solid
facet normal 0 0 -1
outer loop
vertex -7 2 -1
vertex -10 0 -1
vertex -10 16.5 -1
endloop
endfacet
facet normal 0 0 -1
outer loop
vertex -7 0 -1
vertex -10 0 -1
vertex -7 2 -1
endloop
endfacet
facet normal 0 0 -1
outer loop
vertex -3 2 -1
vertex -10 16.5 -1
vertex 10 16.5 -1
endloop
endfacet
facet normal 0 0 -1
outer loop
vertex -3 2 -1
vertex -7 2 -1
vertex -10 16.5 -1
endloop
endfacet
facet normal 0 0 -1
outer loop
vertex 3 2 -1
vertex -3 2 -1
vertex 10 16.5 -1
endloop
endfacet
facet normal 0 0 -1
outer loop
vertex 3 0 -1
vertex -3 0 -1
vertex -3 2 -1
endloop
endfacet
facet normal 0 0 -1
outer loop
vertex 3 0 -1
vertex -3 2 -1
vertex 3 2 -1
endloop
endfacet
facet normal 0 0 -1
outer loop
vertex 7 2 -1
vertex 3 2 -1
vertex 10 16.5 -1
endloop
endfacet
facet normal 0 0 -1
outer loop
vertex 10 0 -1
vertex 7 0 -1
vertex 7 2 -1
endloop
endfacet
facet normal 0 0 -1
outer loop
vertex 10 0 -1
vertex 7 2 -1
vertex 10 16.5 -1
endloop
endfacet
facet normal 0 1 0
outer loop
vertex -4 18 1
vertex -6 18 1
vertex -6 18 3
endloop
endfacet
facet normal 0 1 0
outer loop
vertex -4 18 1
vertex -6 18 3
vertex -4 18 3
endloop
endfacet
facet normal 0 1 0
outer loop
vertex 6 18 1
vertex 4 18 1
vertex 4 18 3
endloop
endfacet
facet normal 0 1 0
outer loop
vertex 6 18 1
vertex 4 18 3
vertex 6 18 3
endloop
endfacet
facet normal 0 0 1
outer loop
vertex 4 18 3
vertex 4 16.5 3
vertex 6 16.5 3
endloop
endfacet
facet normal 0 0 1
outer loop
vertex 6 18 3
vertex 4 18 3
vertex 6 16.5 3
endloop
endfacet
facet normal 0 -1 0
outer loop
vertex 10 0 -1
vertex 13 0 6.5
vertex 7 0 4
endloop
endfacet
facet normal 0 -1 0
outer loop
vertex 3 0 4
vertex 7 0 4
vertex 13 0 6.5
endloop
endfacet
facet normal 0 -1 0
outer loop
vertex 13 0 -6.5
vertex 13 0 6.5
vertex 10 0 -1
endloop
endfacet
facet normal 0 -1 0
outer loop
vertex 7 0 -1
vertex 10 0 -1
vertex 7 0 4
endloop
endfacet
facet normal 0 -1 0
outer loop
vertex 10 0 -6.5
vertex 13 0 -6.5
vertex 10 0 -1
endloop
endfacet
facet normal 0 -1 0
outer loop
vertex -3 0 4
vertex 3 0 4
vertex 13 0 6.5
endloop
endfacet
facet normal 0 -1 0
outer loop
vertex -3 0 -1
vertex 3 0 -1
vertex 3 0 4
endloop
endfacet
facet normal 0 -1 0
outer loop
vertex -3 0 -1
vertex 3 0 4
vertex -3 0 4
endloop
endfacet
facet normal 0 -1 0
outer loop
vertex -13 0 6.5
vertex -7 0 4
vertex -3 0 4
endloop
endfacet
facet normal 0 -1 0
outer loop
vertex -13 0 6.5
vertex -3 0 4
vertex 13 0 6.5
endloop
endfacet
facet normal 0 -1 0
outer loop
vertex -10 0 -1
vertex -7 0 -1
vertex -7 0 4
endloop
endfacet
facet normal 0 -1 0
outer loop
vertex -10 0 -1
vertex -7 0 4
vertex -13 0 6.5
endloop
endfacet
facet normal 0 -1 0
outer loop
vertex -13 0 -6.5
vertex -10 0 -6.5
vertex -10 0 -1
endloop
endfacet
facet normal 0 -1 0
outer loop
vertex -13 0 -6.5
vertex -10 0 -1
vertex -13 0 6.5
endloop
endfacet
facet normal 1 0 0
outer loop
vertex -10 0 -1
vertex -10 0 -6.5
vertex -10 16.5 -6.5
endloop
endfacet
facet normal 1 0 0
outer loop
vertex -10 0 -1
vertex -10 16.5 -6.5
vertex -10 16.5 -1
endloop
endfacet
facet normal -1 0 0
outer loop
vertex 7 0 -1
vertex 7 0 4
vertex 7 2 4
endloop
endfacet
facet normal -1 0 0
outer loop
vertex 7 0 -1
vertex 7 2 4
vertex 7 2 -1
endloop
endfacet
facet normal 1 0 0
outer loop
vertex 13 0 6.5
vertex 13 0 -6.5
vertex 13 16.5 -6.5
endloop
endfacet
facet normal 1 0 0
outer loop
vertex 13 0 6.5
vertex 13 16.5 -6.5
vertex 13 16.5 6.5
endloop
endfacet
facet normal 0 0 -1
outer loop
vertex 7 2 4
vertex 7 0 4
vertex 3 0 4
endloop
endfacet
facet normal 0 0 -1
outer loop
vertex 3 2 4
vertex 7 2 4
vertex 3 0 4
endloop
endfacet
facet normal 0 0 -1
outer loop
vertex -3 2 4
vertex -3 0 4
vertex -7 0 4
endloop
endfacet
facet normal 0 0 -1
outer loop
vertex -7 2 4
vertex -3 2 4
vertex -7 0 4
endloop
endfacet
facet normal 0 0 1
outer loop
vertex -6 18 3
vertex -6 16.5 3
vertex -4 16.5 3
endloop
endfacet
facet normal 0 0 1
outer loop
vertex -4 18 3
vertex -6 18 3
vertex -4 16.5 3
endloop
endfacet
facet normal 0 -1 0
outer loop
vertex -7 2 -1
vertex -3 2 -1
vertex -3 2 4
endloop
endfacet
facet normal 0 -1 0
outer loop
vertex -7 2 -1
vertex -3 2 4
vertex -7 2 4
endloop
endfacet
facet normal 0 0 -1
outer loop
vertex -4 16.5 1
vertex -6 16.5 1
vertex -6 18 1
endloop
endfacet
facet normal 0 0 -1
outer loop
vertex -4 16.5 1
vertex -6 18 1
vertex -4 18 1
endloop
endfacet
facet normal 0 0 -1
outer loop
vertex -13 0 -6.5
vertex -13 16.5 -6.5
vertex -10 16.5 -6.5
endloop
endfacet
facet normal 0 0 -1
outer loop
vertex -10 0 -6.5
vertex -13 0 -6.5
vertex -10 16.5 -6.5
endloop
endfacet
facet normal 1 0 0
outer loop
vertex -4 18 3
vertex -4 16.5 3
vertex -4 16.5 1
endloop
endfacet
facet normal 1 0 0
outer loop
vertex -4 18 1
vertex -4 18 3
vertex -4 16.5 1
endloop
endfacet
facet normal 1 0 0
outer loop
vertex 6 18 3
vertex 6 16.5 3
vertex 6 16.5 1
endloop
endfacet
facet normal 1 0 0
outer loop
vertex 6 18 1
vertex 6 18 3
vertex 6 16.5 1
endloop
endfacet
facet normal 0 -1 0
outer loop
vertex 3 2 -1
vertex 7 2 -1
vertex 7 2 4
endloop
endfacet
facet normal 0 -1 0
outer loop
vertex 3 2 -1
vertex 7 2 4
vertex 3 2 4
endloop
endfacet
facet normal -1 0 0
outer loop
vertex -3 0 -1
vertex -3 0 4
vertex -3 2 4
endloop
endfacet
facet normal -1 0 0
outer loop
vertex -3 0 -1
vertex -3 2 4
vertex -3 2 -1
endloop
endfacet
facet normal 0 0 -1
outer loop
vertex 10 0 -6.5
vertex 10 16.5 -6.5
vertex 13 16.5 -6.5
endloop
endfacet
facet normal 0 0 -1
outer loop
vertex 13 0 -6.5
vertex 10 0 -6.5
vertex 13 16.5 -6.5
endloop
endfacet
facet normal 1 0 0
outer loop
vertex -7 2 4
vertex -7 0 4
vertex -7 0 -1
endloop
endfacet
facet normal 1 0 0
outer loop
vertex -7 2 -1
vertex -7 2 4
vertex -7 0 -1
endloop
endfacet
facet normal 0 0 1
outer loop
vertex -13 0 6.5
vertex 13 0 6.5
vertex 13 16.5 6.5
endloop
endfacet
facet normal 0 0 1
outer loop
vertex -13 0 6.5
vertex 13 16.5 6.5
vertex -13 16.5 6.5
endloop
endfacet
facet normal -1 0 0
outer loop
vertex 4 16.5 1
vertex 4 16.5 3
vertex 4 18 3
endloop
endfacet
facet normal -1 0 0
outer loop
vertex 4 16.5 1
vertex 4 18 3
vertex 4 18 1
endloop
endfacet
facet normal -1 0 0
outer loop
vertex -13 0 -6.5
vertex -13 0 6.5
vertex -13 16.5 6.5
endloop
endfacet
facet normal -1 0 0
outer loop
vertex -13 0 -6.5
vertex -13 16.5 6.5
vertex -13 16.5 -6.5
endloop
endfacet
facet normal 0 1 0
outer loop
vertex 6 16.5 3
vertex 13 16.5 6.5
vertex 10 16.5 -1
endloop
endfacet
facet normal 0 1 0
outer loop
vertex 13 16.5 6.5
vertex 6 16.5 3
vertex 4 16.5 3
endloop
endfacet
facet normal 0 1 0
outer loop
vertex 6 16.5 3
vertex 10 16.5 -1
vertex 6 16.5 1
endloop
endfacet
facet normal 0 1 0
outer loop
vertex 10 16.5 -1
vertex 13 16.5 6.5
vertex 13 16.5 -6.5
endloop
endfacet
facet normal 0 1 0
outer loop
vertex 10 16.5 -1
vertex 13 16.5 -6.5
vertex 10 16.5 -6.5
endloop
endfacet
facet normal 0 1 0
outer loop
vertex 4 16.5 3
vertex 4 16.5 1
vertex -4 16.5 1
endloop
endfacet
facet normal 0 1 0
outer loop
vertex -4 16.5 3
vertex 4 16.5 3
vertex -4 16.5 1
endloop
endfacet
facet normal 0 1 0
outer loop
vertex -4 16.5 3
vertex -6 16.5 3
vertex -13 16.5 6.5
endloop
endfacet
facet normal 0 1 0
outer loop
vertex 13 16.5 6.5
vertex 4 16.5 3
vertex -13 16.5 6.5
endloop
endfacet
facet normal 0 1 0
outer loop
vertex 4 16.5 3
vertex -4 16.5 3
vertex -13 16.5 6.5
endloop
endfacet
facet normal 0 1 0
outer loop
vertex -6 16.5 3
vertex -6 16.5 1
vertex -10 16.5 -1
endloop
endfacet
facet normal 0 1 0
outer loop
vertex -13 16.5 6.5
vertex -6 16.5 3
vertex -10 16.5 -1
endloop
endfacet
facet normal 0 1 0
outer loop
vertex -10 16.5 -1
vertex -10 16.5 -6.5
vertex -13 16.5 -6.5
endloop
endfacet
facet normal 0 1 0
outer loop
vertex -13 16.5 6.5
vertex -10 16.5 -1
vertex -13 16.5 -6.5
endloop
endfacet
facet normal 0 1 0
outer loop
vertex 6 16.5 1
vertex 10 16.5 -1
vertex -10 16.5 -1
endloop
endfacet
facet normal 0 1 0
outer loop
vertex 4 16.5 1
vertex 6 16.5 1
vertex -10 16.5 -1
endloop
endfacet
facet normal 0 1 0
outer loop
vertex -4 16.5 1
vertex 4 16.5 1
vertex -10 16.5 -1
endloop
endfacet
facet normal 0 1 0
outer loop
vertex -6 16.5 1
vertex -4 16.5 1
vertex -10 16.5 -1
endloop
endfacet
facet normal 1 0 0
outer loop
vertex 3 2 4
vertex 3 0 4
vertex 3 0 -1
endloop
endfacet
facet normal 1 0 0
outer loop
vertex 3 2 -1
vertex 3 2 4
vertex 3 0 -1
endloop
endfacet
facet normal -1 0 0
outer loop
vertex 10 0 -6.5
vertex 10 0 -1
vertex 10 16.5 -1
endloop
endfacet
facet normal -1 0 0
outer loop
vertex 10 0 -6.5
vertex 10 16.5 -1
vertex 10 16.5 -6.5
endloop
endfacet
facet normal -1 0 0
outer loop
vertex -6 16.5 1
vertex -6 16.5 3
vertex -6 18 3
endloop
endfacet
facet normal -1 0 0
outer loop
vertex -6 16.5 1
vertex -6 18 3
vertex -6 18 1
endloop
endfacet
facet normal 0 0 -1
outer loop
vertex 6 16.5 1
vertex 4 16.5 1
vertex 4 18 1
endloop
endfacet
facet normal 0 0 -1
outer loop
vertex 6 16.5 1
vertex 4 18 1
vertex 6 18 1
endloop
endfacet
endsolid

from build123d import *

# Parameters (mm, degrees)
EXTRUDE_1_DEPTH     = 16.5
SKETCH_2_W          = 4
SKETCH_2_H          = 5
CUT_EXTRUDE_1_DEPTH = 2
SKETCH_3_W          = 2
SKETCH_3_H          = 2
EXTRUDE_2_DEPTH     = 1.5


with BuildPart() as part:
    # Эскиз1 → Бобышка-Вытянуть1 (new body)
    with BuildSketch(Plane(origin=(0, 0, 0), x_dir=(1, 0, 0), z_dir=(0, 1, 0))):
        Polygon((-10, 1), (10, 1), (10, 6.5), (13, 6.5), (13, -6.5), (-13, -6.5), (-13, 6.5), (-10, 6.5), align=None)
    extrude(amount=EXTRUDE_1_DEPTH)

    # Эскиз2 → Вырез-Вытянуть1 (cut)
    with BuildSketch(Plane(origin=(0, 0, 0), x_dir=(-1, 0, 0), z_dir=(0, -1, 0))):
        with Locations((-5, -1.5)):
            Rectangle(SKETCH_2_W, SKETCH_2_H)
        with Locations((5, -1.5)):
            Rectangle(SKETCH_2_W, SKETCH_2_H)
    extrude(amount=-CUT_EXTRUDE_1_DEPTH, mode=Mode.SUBTRACT)

    # Эскиз3 → Бобышка-Вытянуть2 (add)
    with BuildSketch(Plane(origin=(0, 16.5, 0), x_dir=(1, 0, 0), z_dir=(0, 1, 0))):
        with Locations((-5, -2)):
            Rectangle(SKETCH_3_W, SKETCH_3_H)
        with Locations((5, -2)):
            Rectangle(SKETCH_3_W, SKETCH_3_H)
    extrude(amount=EXTRUDE_2_DEPTH)


solid = part.part
